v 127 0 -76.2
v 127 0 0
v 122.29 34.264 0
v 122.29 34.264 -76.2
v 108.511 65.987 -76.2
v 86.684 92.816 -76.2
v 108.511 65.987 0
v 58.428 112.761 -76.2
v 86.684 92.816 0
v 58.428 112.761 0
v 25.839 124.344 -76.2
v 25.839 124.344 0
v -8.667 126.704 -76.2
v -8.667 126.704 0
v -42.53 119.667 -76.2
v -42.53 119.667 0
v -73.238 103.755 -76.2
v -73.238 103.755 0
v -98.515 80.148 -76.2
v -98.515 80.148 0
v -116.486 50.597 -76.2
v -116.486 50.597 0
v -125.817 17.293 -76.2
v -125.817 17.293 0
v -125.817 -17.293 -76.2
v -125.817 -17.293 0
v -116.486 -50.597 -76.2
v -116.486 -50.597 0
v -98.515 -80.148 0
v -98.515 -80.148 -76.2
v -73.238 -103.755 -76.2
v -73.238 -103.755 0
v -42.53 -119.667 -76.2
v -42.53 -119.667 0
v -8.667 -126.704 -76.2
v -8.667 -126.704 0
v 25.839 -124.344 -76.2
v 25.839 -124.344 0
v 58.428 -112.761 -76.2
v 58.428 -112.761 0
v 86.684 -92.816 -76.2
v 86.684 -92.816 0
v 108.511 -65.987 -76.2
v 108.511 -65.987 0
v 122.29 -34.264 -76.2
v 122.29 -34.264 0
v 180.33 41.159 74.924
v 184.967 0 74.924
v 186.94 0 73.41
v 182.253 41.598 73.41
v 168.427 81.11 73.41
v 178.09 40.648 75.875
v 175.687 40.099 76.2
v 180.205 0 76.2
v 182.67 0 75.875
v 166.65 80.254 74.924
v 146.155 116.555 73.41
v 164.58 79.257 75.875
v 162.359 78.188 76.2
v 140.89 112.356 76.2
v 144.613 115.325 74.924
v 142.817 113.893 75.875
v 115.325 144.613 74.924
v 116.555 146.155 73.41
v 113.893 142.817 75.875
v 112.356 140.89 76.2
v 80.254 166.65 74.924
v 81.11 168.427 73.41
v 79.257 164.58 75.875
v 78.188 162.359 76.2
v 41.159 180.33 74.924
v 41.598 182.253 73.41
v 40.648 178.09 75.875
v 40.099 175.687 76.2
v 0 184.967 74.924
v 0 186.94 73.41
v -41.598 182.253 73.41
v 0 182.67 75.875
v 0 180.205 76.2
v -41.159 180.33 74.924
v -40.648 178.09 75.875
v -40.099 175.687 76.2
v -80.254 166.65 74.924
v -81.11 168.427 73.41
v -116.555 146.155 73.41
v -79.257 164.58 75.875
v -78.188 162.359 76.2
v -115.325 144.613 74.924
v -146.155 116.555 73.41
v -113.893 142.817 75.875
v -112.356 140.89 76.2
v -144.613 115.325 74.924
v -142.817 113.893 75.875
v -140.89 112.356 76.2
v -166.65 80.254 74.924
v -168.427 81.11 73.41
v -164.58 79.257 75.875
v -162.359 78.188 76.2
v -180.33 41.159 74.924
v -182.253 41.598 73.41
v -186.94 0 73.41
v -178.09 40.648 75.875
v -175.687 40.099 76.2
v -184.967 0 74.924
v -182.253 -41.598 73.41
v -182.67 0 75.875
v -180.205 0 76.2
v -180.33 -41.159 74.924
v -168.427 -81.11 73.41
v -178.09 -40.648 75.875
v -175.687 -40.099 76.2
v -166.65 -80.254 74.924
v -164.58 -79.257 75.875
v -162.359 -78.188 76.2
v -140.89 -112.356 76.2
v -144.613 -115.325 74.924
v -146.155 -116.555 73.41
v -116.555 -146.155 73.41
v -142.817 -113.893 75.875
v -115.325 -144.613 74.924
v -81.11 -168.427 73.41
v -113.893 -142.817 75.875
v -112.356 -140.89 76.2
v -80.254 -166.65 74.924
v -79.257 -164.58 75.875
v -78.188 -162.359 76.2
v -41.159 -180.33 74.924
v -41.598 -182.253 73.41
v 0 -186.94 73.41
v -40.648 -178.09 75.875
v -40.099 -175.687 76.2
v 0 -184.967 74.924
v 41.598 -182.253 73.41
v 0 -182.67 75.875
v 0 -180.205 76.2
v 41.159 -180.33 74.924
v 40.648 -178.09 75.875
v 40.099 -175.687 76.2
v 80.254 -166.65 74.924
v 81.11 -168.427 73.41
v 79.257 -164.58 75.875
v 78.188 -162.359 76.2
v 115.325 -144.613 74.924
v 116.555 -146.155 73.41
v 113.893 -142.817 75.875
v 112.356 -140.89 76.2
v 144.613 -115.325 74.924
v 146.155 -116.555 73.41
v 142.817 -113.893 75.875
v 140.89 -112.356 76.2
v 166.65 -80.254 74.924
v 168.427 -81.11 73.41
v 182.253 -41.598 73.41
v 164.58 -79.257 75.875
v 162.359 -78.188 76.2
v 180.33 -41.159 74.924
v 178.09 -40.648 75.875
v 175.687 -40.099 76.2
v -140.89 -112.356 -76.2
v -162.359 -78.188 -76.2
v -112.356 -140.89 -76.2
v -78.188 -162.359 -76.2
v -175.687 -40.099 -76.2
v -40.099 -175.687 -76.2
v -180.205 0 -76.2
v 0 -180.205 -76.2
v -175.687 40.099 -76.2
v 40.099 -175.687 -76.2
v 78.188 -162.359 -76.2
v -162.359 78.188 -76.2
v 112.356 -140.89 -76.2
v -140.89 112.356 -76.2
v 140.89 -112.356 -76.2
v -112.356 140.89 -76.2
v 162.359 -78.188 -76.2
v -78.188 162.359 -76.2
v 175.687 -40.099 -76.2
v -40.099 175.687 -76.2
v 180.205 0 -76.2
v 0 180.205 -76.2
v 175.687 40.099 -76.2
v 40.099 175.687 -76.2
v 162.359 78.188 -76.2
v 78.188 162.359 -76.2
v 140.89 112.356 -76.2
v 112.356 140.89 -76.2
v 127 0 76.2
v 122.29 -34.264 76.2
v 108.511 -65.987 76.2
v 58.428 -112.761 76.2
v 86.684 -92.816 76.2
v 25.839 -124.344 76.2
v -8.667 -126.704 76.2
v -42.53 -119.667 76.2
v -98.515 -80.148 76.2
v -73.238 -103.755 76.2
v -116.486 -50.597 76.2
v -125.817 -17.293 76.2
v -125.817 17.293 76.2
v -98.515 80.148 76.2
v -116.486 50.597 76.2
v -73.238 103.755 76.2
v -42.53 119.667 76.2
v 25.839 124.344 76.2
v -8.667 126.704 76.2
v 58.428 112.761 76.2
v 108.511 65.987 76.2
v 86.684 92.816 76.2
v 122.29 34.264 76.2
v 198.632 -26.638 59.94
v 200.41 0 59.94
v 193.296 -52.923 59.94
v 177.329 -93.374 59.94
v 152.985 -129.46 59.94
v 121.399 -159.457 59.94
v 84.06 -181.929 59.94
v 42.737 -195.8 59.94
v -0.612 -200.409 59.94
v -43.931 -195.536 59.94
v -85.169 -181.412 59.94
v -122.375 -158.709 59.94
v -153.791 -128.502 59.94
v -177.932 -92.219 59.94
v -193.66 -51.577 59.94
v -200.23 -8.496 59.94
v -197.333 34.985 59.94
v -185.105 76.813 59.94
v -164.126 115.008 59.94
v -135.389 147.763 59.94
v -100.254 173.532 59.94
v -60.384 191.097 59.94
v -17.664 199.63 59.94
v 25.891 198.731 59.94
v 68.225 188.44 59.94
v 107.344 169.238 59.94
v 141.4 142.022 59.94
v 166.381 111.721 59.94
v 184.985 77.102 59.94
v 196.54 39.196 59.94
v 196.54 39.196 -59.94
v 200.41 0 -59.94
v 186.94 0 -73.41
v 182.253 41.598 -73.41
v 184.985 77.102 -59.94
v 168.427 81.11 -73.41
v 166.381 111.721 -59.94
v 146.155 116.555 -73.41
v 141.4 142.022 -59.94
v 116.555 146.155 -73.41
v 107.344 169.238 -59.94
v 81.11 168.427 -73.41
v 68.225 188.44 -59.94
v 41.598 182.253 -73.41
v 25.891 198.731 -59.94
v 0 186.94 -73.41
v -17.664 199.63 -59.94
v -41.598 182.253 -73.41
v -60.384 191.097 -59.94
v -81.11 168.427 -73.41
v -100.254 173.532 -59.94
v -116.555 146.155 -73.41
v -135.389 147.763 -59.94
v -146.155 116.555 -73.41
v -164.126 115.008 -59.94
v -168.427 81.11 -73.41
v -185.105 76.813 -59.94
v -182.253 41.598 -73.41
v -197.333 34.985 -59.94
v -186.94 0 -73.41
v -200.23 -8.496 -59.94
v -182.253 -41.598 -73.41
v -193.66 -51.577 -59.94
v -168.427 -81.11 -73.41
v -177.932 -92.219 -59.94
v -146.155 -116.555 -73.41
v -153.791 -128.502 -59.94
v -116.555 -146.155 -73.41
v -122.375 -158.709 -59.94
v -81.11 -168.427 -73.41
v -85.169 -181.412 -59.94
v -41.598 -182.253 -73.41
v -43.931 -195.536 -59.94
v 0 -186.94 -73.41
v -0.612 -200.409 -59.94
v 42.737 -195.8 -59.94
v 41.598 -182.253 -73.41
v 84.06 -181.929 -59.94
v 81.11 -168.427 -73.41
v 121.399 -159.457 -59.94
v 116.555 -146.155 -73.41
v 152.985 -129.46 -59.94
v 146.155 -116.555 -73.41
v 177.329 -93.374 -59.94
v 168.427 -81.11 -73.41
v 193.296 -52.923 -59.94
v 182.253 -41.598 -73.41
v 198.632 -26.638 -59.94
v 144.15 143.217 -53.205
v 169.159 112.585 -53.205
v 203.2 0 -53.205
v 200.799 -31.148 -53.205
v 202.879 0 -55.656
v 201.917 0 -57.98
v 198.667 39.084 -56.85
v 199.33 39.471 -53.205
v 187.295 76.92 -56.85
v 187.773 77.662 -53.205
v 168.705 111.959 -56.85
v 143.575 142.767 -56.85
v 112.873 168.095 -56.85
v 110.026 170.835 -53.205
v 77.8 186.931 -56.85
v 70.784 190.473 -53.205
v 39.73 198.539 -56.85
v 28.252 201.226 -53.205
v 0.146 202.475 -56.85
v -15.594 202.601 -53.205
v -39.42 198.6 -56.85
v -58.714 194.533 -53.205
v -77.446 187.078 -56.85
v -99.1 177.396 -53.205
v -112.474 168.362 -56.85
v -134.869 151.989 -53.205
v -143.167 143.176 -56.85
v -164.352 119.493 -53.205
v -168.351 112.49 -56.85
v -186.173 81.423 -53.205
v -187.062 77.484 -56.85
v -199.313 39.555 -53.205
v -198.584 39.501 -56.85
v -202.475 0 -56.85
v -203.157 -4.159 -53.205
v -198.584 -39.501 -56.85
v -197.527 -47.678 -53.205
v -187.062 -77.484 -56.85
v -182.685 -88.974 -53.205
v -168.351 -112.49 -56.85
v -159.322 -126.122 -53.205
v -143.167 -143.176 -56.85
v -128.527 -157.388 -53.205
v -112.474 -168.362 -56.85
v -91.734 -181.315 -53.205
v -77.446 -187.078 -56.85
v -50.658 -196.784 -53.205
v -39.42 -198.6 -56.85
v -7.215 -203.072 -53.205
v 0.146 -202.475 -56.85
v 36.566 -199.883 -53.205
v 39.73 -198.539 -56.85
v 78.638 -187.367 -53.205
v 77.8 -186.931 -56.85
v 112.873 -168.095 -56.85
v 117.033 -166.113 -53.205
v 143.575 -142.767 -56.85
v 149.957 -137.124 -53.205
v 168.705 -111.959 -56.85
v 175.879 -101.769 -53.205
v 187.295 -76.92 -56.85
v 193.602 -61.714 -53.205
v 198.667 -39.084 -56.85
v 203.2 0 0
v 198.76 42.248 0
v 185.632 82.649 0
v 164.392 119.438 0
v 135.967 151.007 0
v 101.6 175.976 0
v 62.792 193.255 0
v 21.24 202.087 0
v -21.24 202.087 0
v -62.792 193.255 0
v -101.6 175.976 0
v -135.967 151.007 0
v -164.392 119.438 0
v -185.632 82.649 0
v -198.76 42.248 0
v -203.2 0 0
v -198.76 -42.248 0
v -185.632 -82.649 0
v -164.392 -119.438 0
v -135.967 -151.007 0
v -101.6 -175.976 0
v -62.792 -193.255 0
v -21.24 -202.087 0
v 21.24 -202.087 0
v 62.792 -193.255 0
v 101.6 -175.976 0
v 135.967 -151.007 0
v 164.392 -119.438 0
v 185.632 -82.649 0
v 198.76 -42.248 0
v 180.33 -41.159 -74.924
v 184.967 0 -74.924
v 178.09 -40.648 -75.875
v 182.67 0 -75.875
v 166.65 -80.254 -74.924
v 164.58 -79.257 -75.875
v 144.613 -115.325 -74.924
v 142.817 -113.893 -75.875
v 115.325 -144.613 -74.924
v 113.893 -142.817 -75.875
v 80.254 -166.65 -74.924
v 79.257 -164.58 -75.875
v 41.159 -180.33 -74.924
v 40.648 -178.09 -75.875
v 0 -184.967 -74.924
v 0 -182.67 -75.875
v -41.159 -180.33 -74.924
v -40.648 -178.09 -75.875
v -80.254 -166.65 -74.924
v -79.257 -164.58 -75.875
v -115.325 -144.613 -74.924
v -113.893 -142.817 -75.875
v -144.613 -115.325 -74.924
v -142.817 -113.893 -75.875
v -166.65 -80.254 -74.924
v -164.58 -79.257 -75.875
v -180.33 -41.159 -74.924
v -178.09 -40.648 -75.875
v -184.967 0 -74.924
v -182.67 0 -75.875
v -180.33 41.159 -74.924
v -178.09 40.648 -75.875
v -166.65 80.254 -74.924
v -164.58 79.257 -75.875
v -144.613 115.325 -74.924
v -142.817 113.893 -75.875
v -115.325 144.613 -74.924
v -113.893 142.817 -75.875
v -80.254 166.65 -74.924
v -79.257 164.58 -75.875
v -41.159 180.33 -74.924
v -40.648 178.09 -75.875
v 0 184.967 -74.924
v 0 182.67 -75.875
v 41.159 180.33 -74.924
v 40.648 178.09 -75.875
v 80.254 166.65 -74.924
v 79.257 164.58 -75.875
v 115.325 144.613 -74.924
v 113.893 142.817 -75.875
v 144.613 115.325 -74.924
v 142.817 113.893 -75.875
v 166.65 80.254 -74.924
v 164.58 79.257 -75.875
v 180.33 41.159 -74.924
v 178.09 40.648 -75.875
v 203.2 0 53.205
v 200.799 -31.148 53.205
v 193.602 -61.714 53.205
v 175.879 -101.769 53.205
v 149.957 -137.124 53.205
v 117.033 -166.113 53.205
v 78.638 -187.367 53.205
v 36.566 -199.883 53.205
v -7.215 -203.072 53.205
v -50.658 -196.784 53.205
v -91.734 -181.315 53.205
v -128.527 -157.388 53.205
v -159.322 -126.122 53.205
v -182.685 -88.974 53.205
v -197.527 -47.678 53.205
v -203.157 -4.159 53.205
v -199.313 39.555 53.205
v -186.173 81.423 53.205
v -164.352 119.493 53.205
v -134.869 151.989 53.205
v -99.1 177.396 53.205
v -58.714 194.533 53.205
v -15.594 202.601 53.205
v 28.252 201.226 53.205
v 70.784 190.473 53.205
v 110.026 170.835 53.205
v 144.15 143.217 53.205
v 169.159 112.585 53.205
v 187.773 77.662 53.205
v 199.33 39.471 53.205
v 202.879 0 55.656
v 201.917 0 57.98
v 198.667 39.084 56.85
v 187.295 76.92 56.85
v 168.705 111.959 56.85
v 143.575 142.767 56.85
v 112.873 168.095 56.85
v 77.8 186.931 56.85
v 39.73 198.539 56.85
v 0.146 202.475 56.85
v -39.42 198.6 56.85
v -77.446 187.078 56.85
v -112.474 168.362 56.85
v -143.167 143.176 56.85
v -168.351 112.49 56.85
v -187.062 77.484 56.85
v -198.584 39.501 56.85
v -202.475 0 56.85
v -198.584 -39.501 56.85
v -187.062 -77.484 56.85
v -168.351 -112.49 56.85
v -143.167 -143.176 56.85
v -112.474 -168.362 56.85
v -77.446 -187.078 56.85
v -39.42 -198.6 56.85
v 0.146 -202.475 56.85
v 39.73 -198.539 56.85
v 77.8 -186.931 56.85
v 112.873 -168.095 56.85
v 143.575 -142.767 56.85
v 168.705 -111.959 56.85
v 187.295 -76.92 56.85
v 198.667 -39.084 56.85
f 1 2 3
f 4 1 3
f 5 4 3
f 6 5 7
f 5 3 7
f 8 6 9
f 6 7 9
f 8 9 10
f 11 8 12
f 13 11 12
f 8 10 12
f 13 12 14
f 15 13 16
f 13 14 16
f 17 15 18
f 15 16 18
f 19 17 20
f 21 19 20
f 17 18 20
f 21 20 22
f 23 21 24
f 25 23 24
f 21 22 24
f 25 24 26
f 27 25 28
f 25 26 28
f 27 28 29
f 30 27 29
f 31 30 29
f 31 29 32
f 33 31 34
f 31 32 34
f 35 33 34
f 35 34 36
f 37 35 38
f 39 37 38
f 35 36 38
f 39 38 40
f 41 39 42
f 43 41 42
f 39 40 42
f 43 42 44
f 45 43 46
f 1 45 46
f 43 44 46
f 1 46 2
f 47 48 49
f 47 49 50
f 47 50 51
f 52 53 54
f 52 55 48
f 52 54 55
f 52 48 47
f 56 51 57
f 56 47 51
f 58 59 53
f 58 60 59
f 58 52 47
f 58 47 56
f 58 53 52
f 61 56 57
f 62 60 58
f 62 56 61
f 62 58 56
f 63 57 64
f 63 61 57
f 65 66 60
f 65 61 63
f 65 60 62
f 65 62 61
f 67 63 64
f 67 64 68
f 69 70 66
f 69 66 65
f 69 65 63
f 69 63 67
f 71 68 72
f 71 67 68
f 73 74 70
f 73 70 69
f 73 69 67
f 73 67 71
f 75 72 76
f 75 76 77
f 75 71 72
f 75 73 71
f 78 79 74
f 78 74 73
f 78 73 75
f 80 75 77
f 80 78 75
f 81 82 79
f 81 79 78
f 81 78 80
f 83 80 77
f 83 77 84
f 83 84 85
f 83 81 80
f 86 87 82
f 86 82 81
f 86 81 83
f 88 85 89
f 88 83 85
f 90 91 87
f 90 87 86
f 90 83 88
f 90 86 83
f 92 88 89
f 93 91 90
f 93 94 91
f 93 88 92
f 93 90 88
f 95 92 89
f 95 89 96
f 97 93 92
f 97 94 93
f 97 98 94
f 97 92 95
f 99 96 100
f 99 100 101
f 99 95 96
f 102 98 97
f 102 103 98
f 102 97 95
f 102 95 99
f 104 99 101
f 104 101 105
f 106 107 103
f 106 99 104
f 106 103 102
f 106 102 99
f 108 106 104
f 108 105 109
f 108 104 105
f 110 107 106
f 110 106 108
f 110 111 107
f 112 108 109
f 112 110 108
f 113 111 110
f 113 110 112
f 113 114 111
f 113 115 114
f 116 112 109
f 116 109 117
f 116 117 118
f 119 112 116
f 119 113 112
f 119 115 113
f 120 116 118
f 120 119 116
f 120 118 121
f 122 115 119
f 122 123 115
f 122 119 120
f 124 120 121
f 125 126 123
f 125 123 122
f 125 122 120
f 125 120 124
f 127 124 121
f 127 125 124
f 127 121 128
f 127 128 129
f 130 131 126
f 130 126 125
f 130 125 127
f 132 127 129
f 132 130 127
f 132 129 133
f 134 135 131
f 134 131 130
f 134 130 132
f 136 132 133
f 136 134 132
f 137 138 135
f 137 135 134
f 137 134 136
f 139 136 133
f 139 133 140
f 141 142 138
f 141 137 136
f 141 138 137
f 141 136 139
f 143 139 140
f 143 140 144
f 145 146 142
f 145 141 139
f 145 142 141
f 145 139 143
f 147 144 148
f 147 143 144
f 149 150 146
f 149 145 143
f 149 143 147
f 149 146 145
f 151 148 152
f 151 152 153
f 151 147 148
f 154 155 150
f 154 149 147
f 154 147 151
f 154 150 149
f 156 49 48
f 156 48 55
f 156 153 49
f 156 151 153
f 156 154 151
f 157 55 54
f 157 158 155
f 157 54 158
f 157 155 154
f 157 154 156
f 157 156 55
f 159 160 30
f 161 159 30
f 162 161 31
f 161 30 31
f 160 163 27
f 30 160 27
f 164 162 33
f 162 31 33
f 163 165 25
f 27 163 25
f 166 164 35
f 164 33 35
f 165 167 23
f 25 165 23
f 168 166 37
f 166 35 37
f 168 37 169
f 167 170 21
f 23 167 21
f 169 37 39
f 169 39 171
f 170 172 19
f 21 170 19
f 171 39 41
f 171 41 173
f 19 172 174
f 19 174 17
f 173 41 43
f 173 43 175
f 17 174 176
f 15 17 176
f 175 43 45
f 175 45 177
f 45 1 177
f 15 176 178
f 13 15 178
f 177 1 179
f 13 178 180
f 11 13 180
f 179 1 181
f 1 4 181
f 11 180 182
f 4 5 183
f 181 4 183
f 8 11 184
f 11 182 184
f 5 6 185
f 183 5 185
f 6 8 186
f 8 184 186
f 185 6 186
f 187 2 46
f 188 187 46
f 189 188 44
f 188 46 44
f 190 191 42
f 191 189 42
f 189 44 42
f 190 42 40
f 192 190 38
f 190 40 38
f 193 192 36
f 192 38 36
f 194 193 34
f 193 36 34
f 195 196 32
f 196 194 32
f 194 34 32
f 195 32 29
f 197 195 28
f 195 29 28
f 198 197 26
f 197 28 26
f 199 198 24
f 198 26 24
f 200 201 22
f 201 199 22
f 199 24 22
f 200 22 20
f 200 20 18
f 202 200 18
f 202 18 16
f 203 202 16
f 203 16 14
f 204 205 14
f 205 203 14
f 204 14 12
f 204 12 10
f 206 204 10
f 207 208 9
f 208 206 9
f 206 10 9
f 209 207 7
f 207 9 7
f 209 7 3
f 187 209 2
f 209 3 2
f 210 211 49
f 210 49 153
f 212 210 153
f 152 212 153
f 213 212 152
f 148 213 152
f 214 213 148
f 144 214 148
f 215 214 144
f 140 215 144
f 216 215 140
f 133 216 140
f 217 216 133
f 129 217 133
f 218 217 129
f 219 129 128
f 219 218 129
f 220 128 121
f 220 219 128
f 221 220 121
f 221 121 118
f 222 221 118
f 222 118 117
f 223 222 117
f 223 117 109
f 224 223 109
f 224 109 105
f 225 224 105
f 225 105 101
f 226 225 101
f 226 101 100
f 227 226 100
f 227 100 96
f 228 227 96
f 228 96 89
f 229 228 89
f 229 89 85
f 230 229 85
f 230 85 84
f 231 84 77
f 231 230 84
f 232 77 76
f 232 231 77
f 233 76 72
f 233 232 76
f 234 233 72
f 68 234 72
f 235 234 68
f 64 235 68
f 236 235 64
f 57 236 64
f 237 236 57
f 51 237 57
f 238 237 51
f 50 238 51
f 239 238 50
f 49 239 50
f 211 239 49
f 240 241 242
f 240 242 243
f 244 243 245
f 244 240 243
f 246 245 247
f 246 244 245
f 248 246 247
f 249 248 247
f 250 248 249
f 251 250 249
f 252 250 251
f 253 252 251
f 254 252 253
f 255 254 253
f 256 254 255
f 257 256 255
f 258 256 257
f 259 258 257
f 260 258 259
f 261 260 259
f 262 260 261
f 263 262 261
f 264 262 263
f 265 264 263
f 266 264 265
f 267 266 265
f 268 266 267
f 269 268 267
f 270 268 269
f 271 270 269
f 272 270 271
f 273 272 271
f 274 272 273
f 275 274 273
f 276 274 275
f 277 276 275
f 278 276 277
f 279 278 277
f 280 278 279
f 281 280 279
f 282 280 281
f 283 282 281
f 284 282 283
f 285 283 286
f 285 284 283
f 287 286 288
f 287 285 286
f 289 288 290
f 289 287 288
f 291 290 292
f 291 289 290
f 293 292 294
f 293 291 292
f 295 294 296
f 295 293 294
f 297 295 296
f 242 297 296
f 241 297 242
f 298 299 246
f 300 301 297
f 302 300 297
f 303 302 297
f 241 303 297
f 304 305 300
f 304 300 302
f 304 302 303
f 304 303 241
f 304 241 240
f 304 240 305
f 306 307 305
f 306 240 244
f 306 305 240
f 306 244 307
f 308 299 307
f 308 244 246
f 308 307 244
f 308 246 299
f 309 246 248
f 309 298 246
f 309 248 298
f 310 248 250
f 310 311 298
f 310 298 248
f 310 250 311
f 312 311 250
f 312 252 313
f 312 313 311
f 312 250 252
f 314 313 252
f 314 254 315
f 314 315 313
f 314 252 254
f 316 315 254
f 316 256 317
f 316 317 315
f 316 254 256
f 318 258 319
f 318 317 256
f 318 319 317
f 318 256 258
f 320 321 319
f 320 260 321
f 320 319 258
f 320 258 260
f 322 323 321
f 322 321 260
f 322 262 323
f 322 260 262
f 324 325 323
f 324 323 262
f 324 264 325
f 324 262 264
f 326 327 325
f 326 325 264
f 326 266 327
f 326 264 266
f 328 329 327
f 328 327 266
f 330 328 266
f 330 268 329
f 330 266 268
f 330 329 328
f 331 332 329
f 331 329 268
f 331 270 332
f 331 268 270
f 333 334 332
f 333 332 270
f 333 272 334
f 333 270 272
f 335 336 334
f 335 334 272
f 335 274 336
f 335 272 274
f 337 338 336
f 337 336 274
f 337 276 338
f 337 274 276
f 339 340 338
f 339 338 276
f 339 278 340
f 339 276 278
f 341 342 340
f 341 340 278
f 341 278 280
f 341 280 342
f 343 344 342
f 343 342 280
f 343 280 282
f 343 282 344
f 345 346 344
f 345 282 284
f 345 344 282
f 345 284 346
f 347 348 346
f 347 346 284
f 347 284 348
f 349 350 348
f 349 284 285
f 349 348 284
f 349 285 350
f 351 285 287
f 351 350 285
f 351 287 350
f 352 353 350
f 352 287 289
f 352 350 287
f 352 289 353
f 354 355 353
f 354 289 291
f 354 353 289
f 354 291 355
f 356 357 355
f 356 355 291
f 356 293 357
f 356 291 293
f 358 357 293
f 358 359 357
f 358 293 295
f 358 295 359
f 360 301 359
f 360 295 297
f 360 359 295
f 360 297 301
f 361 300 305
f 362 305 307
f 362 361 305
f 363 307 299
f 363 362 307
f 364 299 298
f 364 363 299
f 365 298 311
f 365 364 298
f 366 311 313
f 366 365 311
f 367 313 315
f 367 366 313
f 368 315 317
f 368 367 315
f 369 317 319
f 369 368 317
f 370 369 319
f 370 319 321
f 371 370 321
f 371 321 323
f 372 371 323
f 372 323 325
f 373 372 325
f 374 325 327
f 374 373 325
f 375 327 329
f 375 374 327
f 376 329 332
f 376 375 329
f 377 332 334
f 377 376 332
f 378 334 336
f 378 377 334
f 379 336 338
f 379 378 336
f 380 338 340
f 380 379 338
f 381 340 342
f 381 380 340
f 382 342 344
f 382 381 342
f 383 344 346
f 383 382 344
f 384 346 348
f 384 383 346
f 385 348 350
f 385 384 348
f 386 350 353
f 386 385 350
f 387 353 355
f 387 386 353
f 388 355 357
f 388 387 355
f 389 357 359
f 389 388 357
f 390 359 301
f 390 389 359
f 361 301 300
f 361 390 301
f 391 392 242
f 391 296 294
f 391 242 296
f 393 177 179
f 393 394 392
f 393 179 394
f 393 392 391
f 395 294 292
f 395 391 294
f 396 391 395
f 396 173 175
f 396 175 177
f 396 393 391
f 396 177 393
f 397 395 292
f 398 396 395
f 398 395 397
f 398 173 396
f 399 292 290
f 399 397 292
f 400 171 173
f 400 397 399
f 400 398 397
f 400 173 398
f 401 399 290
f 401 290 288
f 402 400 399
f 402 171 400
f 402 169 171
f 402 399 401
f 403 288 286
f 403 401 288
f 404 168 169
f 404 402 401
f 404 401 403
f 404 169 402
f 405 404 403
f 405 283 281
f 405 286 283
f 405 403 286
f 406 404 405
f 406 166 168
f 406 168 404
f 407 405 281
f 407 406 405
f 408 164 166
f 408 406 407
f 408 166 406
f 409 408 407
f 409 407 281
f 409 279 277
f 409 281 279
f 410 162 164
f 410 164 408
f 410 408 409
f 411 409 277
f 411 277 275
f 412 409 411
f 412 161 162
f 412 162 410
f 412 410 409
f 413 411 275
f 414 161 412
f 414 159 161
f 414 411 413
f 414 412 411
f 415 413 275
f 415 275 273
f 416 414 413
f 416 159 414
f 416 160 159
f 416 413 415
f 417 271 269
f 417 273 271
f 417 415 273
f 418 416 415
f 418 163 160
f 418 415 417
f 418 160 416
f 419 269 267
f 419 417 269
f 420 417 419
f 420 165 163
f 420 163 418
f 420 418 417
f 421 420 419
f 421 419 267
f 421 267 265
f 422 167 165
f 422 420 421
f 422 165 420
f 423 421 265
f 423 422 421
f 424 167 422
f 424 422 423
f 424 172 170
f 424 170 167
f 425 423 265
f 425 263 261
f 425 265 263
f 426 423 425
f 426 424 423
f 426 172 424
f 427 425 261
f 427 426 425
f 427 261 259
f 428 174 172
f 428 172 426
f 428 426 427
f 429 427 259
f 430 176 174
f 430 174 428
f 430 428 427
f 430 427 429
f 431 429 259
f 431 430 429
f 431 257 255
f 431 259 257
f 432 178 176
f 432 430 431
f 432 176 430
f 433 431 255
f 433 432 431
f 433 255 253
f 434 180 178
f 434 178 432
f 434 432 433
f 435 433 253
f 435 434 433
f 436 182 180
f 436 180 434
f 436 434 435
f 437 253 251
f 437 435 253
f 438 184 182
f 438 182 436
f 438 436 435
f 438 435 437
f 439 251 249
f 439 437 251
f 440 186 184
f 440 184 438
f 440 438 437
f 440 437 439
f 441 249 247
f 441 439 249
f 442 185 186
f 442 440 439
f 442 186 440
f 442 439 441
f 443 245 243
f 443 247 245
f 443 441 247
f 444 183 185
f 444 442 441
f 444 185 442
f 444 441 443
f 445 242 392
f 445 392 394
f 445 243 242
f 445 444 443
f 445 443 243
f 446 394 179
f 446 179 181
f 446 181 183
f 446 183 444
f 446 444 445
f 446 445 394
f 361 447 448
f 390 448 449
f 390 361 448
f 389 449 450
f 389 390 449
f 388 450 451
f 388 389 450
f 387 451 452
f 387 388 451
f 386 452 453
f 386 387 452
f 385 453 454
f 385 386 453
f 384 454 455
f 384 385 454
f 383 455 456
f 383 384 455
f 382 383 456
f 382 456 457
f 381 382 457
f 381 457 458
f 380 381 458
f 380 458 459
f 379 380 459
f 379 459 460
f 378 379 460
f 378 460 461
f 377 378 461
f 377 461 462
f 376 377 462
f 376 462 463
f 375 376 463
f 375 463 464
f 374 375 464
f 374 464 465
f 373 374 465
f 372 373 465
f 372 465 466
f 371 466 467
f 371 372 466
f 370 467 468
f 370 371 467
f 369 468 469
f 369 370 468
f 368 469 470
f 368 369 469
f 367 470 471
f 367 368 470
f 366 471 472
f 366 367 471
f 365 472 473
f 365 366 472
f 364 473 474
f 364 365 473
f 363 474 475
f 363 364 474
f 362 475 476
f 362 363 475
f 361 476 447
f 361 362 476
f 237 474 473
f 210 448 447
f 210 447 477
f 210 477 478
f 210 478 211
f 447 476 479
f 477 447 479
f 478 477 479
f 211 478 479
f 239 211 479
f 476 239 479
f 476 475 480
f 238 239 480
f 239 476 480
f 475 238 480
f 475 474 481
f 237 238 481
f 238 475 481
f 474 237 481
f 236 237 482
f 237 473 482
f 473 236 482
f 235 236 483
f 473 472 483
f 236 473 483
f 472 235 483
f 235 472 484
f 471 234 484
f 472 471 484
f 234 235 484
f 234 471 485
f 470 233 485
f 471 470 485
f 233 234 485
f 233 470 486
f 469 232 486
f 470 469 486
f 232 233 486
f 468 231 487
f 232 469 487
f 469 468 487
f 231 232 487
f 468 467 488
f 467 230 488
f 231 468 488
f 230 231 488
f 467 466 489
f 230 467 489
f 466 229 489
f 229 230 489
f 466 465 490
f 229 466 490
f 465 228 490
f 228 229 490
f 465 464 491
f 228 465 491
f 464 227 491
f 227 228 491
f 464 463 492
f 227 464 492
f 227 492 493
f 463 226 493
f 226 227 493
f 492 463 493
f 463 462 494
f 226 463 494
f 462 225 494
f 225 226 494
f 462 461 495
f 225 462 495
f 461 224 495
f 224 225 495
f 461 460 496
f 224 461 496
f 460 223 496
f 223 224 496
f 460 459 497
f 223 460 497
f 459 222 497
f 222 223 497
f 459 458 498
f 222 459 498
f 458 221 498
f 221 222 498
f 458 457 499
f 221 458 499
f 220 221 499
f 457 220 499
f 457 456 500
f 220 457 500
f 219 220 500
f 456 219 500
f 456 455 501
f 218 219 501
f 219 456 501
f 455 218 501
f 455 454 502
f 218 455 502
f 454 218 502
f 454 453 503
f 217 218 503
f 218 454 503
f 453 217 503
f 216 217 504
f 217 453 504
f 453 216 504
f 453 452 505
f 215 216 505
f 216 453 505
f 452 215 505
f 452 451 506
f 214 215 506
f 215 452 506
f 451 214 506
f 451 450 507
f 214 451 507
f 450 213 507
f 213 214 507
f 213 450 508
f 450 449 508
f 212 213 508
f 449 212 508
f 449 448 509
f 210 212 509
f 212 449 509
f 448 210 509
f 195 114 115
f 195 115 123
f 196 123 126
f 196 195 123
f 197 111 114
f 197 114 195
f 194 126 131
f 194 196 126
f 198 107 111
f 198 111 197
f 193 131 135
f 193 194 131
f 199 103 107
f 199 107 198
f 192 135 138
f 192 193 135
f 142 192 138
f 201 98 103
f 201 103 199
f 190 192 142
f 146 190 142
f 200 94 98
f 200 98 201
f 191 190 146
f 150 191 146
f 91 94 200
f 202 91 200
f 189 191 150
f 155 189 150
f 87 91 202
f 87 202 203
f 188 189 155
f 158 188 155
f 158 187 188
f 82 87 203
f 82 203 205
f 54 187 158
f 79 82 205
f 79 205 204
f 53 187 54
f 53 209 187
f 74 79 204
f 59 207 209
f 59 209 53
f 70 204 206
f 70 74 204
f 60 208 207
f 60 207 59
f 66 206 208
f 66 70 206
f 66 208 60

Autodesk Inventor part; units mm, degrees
ref_plane "YZ Plane" through (0, 0, 0) normal (1, 0, 0) x (0, 1, 0)
ref_plane "XZ Plane" through (0, 0, 0) normal (0, 1, 0) x (-1, 0, 0)
ref_plane "XY Plane" through (0, 0, 0) normal (0, 0, 1) x (1, 0, 0)
sketch "Sketch1" plane through (0, 0, 0) normal (0, 0, 1) x (1, 0, 0)
  circle A0 centre (0, 0) radius 203.2
  circle A1 centre (0, 0) radius 127
  dimension "d0" = 406.4
  dimension "d1" = 76.2
extrude "Extrusion1" add sketch "Sketch1" along normal mid plane 152.4
chamfer "Chamfer1" distance 19.05 angle 45 2 edges at (-203.2, 0, 76.2) (-203.2, 0, -76.2)
fillet "Fillet2" radius 9.525 4 edges at (-203.2, 0, 57.15) (-184.15, 0, 76.2) (-203.2, 0, -57.15) (-184.15, 0, -76.2)
properties part number "tire"
